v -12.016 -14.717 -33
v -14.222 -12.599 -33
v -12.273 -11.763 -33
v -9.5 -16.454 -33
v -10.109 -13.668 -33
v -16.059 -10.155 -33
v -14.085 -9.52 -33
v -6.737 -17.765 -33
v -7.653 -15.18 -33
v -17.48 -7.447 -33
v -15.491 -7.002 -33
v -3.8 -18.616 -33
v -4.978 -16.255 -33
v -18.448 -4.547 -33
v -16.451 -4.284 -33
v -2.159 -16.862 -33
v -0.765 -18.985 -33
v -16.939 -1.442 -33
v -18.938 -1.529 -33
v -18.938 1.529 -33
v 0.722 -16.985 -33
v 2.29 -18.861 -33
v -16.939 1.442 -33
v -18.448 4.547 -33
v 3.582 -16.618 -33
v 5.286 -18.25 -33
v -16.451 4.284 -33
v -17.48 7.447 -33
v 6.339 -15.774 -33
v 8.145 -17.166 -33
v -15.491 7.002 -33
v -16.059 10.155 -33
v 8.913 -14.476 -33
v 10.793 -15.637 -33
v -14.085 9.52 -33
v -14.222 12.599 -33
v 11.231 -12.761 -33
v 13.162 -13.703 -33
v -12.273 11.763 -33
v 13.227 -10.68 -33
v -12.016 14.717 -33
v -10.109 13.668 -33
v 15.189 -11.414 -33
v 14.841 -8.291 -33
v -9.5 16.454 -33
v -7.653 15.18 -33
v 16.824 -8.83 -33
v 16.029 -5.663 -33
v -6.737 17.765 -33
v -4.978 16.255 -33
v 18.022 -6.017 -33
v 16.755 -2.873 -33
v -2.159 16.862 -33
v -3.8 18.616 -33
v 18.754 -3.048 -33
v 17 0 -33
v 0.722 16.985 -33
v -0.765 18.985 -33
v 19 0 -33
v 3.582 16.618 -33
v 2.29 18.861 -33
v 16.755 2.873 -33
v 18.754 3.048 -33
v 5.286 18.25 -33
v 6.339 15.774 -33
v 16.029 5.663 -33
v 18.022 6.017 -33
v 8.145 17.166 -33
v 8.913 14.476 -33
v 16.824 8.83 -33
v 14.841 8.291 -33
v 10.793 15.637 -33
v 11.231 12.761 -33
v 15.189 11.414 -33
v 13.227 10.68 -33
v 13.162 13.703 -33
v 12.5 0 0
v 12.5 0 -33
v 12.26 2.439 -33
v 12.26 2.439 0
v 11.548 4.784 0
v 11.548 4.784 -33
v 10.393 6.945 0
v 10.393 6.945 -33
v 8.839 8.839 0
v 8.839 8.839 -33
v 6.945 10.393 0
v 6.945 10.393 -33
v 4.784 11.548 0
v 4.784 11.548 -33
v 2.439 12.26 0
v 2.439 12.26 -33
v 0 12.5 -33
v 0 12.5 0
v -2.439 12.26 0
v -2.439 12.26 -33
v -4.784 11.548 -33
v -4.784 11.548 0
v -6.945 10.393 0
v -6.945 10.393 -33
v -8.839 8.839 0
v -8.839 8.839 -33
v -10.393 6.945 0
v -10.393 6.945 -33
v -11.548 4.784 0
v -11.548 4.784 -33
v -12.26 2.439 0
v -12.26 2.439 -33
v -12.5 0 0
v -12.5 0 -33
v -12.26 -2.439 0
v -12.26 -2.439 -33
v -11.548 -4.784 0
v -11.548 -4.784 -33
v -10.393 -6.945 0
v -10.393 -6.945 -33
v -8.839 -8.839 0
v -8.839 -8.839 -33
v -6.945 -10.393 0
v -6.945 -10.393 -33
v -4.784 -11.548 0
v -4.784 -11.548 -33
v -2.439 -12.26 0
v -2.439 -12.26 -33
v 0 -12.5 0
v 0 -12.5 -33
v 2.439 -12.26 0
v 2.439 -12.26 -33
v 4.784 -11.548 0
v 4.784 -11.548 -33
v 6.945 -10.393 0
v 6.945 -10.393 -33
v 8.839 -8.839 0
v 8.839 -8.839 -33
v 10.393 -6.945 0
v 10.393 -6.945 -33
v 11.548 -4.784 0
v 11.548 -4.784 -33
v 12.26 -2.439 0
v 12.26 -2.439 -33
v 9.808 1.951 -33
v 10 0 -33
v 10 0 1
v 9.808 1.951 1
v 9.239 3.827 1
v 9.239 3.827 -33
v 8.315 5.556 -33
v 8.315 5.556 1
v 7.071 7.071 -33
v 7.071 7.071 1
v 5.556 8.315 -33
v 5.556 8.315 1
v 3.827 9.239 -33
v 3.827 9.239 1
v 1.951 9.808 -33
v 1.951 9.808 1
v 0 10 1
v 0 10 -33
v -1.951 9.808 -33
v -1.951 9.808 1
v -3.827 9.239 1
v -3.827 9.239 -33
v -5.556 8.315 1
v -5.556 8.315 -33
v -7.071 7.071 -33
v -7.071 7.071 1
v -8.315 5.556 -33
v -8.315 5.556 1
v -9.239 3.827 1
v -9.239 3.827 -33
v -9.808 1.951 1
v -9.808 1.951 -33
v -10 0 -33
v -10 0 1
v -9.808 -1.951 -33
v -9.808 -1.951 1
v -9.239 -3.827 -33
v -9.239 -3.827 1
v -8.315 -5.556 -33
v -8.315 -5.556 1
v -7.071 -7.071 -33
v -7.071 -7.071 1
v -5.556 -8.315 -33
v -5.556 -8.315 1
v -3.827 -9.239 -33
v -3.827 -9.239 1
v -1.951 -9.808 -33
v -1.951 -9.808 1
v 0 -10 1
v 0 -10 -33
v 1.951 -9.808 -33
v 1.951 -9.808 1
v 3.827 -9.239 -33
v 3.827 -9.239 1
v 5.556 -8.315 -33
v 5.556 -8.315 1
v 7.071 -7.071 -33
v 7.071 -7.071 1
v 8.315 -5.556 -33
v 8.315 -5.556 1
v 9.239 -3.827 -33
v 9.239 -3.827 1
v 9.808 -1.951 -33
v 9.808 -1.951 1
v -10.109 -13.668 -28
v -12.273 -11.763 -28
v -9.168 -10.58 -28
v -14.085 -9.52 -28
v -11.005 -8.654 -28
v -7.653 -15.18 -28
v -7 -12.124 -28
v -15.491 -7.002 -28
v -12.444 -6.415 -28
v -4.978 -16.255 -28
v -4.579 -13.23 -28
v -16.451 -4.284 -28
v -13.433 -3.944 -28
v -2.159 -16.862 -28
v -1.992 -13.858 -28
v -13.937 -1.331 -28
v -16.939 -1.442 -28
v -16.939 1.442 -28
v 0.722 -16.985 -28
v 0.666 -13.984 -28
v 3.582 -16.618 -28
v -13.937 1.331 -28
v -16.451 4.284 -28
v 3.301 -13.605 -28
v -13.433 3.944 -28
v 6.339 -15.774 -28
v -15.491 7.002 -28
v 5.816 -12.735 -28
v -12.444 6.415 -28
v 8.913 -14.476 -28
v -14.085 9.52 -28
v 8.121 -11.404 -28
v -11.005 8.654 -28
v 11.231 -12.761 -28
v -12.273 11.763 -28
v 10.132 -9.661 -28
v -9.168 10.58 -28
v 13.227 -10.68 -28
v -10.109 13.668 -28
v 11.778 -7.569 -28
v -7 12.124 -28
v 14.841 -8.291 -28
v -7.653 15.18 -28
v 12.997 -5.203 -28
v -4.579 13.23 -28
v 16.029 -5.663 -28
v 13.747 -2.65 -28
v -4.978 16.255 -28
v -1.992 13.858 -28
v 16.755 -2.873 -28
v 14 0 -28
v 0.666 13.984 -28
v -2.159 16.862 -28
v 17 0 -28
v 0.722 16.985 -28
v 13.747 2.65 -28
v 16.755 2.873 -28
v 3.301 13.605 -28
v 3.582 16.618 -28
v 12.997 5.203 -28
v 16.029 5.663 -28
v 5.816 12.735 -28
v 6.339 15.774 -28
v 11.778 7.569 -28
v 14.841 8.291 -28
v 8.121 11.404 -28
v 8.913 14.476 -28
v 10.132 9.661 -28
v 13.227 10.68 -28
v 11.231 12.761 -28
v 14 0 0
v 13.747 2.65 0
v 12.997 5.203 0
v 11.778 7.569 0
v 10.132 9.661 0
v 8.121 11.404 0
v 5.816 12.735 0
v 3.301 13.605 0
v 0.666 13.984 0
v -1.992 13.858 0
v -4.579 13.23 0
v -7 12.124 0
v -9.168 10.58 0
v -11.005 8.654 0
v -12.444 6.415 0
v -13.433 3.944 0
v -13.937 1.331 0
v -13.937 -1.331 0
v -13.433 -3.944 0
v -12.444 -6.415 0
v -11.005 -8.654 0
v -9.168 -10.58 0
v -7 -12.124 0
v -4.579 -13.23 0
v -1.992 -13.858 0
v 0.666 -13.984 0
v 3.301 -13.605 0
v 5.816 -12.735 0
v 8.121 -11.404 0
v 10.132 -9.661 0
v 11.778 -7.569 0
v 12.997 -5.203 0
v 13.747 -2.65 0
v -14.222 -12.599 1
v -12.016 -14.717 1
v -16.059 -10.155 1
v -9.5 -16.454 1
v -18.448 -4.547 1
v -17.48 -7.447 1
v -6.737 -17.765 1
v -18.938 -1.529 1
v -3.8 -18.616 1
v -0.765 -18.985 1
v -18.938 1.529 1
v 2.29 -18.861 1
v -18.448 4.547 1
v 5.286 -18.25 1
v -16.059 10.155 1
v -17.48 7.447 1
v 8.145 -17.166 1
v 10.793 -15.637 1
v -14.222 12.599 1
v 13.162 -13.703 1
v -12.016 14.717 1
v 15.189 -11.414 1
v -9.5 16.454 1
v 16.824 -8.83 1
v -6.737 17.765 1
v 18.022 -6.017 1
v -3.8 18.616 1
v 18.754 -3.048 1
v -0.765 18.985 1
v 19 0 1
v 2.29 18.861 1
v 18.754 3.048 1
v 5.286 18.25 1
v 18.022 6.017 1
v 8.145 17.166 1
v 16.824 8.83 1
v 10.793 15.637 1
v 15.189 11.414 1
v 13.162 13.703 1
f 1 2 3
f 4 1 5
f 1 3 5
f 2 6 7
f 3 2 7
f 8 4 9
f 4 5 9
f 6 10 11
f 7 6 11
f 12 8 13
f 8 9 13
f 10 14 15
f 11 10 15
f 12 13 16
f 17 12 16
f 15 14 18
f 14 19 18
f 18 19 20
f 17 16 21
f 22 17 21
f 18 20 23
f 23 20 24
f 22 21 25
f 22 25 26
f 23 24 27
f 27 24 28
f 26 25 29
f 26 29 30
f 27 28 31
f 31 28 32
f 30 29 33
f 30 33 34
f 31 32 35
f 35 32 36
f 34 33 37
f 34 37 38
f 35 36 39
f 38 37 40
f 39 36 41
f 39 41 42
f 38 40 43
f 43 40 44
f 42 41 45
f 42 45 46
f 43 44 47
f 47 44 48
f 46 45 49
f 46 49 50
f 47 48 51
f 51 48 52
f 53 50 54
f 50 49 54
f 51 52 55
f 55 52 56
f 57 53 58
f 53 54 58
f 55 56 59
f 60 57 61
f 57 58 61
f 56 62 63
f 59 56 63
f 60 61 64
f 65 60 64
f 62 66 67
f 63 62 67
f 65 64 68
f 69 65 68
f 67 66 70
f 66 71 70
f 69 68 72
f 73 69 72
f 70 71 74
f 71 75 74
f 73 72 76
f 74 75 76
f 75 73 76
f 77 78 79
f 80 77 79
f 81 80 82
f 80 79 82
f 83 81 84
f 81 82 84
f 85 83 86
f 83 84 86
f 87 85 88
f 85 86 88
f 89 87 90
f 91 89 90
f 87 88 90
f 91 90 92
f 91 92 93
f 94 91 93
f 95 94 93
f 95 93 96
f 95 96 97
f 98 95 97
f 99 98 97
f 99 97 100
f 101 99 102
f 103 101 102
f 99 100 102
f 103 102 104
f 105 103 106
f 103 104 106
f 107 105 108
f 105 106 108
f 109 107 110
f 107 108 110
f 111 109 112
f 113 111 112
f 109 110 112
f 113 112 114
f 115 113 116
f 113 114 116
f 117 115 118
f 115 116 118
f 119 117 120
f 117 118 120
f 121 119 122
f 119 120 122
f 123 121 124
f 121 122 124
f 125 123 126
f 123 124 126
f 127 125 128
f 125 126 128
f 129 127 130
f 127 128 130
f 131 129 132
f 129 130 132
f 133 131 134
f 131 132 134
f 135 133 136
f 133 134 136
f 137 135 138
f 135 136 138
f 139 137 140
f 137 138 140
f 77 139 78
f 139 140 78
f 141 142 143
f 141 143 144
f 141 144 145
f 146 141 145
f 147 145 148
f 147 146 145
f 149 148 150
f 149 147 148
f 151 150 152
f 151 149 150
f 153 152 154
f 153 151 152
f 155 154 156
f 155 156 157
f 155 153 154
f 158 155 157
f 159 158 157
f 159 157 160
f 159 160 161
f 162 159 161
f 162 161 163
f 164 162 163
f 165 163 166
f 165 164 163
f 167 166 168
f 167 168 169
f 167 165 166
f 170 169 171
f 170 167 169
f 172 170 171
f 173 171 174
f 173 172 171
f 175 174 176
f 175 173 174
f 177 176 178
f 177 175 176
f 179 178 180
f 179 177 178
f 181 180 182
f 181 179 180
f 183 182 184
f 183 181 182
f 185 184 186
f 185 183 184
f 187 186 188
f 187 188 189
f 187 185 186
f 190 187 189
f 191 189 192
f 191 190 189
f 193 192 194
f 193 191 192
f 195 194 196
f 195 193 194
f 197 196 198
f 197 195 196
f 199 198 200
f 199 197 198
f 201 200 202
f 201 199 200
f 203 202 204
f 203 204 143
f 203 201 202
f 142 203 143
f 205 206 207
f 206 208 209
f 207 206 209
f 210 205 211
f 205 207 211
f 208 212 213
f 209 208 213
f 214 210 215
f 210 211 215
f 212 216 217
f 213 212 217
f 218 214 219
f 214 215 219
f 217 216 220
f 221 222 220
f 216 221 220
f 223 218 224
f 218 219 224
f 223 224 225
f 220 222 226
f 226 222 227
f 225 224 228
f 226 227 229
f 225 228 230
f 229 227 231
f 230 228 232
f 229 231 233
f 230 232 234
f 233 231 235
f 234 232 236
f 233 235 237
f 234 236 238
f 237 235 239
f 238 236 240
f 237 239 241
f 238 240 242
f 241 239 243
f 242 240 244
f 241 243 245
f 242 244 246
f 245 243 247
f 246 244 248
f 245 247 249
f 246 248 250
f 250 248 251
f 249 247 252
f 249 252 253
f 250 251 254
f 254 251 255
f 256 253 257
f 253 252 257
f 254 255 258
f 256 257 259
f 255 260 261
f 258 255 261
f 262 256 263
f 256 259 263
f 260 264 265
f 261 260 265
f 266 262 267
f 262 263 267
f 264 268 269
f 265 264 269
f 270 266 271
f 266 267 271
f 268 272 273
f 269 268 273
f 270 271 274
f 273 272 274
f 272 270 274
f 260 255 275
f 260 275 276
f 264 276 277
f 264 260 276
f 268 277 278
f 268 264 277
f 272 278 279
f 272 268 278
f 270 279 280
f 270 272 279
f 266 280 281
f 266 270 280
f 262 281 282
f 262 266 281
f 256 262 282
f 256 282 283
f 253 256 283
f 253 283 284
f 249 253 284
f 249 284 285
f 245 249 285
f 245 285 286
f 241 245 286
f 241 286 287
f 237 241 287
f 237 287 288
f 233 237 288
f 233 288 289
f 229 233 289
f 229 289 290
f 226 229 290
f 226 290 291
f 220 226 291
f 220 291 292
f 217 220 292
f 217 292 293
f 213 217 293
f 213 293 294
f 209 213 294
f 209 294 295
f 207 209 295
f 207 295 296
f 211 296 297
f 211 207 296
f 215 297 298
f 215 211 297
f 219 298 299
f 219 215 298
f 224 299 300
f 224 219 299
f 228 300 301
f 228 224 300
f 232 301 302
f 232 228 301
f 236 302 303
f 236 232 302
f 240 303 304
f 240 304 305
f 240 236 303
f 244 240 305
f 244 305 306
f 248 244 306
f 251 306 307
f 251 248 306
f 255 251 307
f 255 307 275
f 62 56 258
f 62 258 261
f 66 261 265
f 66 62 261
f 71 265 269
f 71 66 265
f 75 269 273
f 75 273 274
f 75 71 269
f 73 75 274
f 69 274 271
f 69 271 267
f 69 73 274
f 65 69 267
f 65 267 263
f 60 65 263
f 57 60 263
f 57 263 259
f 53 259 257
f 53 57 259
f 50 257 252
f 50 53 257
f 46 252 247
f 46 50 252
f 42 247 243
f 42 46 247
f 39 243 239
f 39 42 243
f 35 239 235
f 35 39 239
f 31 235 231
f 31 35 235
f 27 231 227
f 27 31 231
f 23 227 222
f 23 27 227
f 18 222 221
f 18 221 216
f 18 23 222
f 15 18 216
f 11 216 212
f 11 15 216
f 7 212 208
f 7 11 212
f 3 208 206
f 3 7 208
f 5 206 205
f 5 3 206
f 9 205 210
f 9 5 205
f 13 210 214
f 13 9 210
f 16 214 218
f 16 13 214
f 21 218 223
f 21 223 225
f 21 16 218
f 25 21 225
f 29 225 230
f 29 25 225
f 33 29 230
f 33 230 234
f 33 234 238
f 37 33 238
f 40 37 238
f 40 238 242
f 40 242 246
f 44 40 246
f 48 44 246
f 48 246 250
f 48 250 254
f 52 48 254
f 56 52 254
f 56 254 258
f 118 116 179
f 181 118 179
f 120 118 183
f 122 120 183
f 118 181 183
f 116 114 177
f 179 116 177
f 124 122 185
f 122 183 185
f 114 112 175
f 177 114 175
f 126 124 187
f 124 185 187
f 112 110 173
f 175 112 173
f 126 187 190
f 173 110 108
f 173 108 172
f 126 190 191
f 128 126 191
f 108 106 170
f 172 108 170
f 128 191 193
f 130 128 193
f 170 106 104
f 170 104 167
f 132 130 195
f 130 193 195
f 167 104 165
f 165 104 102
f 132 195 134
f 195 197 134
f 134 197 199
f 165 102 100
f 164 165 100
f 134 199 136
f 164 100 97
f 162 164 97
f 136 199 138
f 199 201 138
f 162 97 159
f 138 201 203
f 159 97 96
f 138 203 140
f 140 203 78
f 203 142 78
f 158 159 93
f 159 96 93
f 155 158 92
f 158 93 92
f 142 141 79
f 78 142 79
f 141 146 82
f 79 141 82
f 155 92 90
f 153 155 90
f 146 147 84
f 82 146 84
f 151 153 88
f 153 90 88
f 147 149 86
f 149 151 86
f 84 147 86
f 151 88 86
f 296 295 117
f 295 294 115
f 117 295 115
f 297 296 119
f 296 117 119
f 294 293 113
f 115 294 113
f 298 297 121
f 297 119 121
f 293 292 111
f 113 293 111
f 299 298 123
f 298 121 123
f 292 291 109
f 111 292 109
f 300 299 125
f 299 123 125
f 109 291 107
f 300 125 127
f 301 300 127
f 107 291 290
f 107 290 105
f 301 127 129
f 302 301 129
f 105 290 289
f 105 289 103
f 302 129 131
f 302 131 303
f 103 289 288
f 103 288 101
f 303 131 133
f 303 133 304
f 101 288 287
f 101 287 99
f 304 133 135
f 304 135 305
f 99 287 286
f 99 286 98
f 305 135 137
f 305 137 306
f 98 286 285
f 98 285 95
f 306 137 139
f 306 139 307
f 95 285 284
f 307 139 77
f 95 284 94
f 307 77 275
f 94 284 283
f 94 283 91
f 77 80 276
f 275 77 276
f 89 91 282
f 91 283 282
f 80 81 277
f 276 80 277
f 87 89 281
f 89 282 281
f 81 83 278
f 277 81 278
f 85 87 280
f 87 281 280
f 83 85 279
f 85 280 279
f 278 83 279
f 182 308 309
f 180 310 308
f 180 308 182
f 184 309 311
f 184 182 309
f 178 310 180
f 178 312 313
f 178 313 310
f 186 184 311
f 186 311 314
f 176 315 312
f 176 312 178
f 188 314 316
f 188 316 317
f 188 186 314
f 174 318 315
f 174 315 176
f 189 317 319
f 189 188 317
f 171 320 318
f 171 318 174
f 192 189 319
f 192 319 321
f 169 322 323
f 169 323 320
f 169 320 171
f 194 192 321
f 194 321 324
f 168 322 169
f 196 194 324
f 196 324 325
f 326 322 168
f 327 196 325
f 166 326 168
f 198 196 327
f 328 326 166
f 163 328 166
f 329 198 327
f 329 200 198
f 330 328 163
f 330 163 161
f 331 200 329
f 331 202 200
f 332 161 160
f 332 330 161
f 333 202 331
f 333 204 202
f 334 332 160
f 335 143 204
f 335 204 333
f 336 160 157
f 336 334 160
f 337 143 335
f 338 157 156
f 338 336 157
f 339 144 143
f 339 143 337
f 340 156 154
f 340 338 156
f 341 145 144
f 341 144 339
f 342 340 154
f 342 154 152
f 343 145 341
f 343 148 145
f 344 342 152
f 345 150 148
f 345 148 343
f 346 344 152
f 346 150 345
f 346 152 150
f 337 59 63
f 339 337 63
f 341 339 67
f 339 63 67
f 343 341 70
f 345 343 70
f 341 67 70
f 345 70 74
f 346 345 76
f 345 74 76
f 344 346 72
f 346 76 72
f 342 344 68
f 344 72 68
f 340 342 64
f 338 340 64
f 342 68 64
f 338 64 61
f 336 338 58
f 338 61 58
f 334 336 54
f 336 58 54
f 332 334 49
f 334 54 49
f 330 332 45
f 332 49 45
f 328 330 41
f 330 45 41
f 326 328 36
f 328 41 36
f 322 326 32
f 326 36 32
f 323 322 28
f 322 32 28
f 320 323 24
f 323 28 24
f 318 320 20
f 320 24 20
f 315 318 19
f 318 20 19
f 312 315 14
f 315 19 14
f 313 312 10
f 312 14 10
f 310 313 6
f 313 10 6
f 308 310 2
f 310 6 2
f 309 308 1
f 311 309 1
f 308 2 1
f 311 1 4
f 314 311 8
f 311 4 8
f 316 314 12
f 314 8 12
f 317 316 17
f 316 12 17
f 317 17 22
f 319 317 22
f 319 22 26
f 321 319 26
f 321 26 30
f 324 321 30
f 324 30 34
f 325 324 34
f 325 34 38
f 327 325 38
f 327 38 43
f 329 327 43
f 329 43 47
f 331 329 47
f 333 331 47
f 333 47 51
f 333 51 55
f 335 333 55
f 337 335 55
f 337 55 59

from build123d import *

# Parameters (mm, degrees)
CYLINDER095_R     = 10
CYLINDER095_DEPTH = 34
CYLINDER093_R     = 1.5
CYLINDER093_DEPTH = 14
CYLINDER090_R     = 12.5
CYLINDER090_DEPTH = 33
CYLINDER094_R     = 1.5
CYLINDER094_DEPTH = 14
CYLINDER088_R     = 14
CYLINDER088_DEPTH = 33
BOX016_W          = 1
BOX016_H          = 1
BOX016_DEPTH      = 1
CYLINDER084_R     = 17
CYLINDER084_DEPTH = 5
CYLINDER_R        = 19
CYLINDER_DEPTH    = 34


with BuildPart() as cylinder001:
    # Cylinder095 → Cylinder095 (new body)
    with BuildSketch(Plane.XY.offset(-33)):
        Circle(CYLINDER095_R)
    extrude(amount=CYLINDER095_DEPTH)


with BuildPart() as ftinsmount1:
    # Cylinder093 → Cylinder093 (new body)
    with BuildSketch(Plane(origin=(53.66, 148, -15), x_dir=(1, 0, 0), z_dir=(0, 0, 1))):
        Circle(CYLINDER093_R)
    extrude(amount=CYLINDER093_DEPTH)


with BuildPart() as ftinsinnerhole:
    # Cylinder090 → Cylinder090 (new body)
    with BuildSketch(Plane(origin=(73.66, 148, -10), x_dir=(1, 0, 0), z_dir=(0, 0, 1))):
        Circle(CYLINDER090_R)
    extrude(amount=CYLINDER090_DEPTH)


with BuildPart() as fusion039:
    # Cylinder094 → Cylinder094 (new body)
    with BuildSketch(Plane(origin=(93.66, 148, -14), x_dir=(1, 0, 0), z_dir=(0, 0, 1))):
        Circle(CYLINDER094_R)
    extrude(amount=CYLINDER094_DEPTH)

    # Fusion039: union FTInsMount1, FTInsInnerHole
    add(ftinsmount1.part)
    add(ftinsinnerhole.part)


with BuildPart() as feedthrough008:
    # Cylinder088 → Cylinder088 (new body)
    with BuildSketch(Plane(origin=(73.66, 148, -10), x_dir=(1, 0, 0), z_dir=(0, 0, 1))):
        Circle(CYLINDER088_R)
    extrude(amount=CYLINDER088_DEPTH)


with BuildPart() as ftinslug:
    # Box016 → Box016 (new body)
    with BuildSketch(Plane(origin=(63, 136, -8), x_dir=(1, 0, 0), z_dir=(0, 0, 1))):
        with Locations((0.5, 0.5)):
            Rectangle(BOX016_W, BOX016_H)
    extrude(amount=BOX016_DEPTH)


with BuildPart() as ftinsulator1:
    # Cylinder084 → Cylinder084 (new body)
    with BuildSketch(Plane(origin=(73.66, 148, -10), x_dir=(1, 0, 0), z_dir=(0, 0, 1))):
        Circle(CYLINDER084_R)
    extrude(amount=CYLINDER084_DEPTH)

    # Fusion038: union Feedthrough008, FTInsLug
    add(feedthrough008.part)
    add(ftinslug.part)

    # Cut010: cut Fusion039
    add(fusion039.part, mode=Mode.SUBTRACT)


with BuildPart() as ftinsulator1_1:
    # Cut010 placement: moved
    add(ftinsulator1.part.moved(Location((-73.66, -148, -23))))


with BuildPart() as cut011:
    # Cylinder → Cylinder (new body)
    with BuildSketch(Plane.XY.offset(-33)):
        Circle(CYLINDER_R)
    extrude(amount=CYLINDER_DEPTH)

    # Cut: cut FTInsulator1
    add(ftinsulator1_1.part, mode=Mode.SUBTRACT)

    # Cut011: cut Cylinder001
    add(cylinder001.part, mode=Mode.SUBTRACT)


solid = cut011.part
